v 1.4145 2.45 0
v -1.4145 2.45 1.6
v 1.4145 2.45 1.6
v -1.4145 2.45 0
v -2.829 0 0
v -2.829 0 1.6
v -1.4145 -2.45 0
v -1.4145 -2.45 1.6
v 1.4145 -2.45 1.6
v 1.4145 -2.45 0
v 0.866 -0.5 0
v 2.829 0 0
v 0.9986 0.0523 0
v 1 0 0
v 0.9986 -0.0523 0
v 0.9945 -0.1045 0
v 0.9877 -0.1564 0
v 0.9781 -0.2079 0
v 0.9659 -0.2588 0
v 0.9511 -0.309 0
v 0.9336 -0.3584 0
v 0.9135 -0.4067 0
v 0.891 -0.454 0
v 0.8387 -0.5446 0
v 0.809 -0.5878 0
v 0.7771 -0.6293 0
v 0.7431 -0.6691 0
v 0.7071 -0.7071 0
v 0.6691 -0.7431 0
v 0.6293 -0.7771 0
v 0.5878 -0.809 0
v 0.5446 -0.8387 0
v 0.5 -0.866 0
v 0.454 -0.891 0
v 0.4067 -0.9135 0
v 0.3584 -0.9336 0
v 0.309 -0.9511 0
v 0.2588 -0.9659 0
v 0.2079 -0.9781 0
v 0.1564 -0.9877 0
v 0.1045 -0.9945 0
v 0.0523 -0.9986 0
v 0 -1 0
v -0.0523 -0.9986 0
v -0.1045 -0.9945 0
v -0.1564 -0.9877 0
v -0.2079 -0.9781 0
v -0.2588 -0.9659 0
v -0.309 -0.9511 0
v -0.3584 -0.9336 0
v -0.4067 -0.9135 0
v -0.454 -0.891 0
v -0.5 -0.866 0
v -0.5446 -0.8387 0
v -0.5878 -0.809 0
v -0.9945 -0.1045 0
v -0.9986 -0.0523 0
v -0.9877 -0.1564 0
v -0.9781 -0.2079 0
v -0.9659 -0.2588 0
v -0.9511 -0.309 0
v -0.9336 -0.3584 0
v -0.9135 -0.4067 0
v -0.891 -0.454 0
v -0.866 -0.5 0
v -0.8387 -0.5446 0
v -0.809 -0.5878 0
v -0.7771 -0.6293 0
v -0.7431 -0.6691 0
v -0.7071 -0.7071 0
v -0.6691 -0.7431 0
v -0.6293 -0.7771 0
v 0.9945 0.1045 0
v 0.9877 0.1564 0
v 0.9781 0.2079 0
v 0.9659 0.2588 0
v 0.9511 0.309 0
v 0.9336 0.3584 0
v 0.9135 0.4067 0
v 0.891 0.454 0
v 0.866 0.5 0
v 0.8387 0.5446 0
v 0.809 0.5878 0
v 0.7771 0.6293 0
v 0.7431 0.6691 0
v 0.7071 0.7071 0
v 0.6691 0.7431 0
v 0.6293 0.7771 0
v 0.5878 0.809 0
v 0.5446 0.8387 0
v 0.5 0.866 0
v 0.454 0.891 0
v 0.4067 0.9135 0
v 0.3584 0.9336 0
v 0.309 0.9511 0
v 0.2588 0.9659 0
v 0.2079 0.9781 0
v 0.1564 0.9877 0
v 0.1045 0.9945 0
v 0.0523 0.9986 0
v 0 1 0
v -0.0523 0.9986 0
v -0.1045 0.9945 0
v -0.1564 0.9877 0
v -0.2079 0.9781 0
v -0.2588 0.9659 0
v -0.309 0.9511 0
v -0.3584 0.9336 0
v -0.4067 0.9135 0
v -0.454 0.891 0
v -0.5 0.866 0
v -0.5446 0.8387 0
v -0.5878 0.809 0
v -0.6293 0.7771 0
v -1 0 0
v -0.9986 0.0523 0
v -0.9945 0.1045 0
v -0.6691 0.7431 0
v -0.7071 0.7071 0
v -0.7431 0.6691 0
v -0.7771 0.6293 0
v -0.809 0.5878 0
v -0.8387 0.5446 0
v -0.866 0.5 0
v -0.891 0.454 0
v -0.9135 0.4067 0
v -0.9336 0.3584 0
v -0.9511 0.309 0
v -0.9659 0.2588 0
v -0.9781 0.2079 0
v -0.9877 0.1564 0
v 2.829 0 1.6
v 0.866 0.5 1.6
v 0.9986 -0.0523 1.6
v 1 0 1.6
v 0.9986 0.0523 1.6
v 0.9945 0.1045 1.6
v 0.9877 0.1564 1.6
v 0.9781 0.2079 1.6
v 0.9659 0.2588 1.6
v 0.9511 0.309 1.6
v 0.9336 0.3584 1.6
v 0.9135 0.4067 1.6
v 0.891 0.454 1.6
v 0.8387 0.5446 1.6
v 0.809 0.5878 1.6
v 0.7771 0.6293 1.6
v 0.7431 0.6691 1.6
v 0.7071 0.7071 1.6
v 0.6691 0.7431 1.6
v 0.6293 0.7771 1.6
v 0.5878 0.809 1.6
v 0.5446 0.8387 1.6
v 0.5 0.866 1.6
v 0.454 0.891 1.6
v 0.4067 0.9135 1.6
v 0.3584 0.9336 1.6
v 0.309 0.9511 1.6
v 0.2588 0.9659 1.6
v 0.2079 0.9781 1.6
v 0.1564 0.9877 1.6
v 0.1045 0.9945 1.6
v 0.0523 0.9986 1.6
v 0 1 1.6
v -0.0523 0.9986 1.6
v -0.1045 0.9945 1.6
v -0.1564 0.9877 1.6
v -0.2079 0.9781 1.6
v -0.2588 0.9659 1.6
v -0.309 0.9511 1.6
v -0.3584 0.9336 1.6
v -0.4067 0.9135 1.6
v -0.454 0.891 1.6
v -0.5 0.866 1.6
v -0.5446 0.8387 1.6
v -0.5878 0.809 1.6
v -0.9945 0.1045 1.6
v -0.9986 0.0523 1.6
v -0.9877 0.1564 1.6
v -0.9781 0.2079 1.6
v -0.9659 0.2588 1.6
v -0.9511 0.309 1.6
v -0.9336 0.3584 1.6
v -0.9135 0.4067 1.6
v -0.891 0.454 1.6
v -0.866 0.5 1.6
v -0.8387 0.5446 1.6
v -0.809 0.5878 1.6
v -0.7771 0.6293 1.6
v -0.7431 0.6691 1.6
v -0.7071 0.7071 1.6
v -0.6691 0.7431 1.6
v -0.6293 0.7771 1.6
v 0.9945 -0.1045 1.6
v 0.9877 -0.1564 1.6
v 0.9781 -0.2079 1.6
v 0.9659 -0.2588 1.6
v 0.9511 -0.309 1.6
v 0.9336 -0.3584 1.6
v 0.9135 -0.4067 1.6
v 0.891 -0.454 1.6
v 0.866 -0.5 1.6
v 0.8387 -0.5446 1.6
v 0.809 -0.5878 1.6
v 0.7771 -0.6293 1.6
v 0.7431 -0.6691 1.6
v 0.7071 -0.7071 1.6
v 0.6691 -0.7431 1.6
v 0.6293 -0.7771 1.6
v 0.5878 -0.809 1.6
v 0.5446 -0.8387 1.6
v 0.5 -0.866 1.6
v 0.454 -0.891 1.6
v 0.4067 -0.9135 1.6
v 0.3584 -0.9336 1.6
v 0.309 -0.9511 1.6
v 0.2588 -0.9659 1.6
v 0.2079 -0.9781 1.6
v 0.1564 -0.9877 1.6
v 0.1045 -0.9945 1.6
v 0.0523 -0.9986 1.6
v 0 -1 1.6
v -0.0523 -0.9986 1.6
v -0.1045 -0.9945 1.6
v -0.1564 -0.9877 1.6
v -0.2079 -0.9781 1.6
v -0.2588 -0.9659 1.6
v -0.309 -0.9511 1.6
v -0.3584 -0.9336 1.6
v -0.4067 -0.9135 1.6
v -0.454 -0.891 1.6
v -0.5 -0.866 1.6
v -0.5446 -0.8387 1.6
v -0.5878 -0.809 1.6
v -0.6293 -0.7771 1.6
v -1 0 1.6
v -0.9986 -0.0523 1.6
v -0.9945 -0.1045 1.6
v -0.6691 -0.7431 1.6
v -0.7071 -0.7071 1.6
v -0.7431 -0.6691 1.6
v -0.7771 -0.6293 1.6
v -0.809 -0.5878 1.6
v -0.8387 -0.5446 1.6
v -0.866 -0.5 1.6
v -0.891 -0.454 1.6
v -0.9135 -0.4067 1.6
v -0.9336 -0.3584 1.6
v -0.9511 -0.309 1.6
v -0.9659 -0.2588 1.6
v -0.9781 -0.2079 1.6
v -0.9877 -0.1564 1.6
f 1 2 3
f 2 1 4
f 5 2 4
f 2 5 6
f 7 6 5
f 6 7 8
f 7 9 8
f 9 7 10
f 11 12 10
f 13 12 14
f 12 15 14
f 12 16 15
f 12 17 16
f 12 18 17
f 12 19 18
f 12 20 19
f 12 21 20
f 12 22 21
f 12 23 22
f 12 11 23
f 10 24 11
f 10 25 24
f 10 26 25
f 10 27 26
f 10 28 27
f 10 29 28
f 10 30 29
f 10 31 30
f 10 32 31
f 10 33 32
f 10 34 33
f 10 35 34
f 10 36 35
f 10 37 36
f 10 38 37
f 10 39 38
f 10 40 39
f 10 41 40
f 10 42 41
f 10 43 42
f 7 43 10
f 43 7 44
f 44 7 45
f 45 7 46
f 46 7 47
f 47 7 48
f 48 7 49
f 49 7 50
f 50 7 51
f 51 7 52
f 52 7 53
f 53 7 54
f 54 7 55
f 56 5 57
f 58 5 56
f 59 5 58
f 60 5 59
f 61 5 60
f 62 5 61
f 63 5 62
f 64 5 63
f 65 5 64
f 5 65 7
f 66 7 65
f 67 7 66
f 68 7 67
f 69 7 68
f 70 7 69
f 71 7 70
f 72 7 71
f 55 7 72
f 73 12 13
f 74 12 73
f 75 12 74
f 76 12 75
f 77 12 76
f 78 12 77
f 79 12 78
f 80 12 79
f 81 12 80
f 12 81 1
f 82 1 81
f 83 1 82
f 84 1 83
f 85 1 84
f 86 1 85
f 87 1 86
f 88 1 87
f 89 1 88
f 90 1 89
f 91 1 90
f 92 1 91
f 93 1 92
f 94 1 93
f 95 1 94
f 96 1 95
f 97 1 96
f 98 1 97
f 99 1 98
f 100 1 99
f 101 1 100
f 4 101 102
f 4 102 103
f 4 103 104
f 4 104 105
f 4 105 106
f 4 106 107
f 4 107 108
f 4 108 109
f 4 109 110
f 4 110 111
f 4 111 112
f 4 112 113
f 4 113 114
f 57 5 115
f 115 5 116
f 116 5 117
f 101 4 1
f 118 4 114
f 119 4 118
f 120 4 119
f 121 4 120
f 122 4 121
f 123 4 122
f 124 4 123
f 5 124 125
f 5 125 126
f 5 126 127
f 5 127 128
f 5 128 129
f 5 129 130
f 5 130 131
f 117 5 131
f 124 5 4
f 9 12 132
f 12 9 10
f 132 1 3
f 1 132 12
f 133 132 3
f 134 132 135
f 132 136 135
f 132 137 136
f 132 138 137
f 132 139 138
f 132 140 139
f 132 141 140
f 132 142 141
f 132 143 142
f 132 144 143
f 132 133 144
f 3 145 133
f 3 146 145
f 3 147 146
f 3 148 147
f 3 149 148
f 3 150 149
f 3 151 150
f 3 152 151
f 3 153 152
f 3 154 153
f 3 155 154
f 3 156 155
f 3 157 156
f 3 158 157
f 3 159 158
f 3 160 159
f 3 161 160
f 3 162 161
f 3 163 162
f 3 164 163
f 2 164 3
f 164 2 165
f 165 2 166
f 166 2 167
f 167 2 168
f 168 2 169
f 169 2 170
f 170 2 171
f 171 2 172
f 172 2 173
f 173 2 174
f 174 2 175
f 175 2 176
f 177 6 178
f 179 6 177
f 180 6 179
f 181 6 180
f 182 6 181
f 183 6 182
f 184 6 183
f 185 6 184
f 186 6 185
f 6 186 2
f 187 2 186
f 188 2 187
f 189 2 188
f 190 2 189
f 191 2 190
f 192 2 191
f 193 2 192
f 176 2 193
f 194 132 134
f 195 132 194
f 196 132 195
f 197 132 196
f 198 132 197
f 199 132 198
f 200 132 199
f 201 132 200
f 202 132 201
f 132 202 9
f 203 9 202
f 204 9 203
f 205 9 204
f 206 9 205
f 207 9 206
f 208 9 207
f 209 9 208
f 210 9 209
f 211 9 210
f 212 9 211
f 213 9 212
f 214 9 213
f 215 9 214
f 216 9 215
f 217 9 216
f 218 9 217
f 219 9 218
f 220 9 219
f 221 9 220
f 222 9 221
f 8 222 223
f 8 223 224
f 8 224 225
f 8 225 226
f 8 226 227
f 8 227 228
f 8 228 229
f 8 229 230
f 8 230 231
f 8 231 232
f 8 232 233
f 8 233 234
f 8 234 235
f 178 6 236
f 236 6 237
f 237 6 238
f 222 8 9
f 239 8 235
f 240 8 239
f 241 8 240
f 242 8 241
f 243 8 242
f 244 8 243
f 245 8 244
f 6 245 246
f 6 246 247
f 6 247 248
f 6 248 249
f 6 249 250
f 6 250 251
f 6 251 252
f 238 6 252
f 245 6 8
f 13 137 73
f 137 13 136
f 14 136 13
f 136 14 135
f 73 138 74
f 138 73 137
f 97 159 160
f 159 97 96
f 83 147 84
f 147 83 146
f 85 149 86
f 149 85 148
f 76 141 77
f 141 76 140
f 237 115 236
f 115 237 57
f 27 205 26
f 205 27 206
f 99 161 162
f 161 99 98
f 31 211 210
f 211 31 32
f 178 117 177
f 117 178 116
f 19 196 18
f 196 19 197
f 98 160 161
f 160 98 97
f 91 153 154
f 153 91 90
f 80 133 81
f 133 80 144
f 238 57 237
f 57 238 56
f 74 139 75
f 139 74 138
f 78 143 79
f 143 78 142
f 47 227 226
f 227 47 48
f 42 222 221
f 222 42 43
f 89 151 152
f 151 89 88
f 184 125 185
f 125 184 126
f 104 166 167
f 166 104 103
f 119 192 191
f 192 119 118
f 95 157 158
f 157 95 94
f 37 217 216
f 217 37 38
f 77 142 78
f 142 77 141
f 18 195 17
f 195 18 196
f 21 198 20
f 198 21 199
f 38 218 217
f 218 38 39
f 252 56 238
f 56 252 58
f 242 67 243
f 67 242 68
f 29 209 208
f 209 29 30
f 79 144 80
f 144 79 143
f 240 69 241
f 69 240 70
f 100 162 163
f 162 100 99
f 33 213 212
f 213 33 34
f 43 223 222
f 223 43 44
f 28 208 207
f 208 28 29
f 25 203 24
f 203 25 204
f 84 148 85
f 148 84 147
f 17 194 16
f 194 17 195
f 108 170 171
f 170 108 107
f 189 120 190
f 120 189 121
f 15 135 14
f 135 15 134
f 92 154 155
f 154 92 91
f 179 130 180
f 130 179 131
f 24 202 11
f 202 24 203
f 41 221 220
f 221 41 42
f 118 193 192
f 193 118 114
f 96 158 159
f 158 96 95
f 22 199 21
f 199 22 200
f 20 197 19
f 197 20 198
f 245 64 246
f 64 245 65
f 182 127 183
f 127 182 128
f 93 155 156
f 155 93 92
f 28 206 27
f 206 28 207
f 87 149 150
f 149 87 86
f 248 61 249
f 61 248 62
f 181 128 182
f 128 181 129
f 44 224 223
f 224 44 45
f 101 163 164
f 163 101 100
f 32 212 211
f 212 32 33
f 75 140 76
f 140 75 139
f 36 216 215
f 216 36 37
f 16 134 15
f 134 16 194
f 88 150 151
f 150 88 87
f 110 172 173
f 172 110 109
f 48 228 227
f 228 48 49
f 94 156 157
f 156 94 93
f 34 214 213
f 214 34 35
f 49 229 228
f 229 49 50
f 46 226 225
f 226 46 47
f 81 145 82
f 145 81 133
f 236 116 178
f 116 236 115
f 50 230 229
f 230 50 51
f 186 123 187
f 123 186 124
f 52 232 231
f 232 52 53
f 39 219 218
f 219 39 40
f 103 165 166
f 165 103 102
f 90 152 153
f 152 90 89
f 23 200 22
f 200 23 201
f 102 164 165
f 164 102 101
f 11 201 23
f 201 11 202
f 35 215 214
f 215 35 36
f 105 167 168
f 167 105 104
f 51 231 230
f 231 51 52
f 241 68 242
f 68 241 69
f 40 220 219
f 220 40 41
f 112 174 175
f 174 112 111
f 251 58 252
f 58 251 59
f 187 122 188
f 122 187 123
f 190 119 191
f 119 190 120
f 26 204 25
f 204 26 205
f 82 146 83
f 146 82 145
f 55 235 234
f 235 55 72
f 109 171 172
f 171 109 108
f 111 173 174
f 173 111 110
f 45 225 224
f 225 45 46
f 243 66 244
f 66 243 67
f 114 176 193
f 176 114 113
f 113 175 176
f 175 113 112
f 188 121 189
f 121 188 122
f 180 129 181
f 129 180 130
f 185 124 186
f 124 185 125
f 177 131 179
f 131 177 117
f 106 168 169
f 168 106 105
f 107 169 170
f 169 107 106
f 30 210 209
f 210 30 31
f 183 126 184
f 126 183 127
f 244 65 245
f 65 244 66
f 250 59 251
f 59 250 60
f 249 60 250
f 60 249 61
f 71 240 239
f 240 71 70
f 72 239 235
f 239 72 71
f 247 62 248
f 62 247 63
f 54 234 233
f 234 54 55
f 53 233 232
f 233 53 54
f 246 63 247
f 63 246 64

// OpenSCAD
$fn = 120;

across_flats = 4.9;   // mm
thickness    = 1.6;   // mm
hole_d       = 2.0;   // mm (clearance/nominal as requested)

module hex_prism_af(af, h) {
    // For a regular hexagon: across_flats = 2 * apothem
    // Circumradius R = apothem / cos(30°) = (af/2) / cos(30°)
    R = (af/2) / cos(30);
    linear_extrude(height = h)
        polygon(points = [for (i = [0:5]) [R*cos(60*i), R*sin(60*i)]]);
}

difference() {
    hex_prism_af(across_flats, thickness);
    translate([0,0,-0.2])
        cylinder(d = hole_d, h = thickness + 0.4);
}
